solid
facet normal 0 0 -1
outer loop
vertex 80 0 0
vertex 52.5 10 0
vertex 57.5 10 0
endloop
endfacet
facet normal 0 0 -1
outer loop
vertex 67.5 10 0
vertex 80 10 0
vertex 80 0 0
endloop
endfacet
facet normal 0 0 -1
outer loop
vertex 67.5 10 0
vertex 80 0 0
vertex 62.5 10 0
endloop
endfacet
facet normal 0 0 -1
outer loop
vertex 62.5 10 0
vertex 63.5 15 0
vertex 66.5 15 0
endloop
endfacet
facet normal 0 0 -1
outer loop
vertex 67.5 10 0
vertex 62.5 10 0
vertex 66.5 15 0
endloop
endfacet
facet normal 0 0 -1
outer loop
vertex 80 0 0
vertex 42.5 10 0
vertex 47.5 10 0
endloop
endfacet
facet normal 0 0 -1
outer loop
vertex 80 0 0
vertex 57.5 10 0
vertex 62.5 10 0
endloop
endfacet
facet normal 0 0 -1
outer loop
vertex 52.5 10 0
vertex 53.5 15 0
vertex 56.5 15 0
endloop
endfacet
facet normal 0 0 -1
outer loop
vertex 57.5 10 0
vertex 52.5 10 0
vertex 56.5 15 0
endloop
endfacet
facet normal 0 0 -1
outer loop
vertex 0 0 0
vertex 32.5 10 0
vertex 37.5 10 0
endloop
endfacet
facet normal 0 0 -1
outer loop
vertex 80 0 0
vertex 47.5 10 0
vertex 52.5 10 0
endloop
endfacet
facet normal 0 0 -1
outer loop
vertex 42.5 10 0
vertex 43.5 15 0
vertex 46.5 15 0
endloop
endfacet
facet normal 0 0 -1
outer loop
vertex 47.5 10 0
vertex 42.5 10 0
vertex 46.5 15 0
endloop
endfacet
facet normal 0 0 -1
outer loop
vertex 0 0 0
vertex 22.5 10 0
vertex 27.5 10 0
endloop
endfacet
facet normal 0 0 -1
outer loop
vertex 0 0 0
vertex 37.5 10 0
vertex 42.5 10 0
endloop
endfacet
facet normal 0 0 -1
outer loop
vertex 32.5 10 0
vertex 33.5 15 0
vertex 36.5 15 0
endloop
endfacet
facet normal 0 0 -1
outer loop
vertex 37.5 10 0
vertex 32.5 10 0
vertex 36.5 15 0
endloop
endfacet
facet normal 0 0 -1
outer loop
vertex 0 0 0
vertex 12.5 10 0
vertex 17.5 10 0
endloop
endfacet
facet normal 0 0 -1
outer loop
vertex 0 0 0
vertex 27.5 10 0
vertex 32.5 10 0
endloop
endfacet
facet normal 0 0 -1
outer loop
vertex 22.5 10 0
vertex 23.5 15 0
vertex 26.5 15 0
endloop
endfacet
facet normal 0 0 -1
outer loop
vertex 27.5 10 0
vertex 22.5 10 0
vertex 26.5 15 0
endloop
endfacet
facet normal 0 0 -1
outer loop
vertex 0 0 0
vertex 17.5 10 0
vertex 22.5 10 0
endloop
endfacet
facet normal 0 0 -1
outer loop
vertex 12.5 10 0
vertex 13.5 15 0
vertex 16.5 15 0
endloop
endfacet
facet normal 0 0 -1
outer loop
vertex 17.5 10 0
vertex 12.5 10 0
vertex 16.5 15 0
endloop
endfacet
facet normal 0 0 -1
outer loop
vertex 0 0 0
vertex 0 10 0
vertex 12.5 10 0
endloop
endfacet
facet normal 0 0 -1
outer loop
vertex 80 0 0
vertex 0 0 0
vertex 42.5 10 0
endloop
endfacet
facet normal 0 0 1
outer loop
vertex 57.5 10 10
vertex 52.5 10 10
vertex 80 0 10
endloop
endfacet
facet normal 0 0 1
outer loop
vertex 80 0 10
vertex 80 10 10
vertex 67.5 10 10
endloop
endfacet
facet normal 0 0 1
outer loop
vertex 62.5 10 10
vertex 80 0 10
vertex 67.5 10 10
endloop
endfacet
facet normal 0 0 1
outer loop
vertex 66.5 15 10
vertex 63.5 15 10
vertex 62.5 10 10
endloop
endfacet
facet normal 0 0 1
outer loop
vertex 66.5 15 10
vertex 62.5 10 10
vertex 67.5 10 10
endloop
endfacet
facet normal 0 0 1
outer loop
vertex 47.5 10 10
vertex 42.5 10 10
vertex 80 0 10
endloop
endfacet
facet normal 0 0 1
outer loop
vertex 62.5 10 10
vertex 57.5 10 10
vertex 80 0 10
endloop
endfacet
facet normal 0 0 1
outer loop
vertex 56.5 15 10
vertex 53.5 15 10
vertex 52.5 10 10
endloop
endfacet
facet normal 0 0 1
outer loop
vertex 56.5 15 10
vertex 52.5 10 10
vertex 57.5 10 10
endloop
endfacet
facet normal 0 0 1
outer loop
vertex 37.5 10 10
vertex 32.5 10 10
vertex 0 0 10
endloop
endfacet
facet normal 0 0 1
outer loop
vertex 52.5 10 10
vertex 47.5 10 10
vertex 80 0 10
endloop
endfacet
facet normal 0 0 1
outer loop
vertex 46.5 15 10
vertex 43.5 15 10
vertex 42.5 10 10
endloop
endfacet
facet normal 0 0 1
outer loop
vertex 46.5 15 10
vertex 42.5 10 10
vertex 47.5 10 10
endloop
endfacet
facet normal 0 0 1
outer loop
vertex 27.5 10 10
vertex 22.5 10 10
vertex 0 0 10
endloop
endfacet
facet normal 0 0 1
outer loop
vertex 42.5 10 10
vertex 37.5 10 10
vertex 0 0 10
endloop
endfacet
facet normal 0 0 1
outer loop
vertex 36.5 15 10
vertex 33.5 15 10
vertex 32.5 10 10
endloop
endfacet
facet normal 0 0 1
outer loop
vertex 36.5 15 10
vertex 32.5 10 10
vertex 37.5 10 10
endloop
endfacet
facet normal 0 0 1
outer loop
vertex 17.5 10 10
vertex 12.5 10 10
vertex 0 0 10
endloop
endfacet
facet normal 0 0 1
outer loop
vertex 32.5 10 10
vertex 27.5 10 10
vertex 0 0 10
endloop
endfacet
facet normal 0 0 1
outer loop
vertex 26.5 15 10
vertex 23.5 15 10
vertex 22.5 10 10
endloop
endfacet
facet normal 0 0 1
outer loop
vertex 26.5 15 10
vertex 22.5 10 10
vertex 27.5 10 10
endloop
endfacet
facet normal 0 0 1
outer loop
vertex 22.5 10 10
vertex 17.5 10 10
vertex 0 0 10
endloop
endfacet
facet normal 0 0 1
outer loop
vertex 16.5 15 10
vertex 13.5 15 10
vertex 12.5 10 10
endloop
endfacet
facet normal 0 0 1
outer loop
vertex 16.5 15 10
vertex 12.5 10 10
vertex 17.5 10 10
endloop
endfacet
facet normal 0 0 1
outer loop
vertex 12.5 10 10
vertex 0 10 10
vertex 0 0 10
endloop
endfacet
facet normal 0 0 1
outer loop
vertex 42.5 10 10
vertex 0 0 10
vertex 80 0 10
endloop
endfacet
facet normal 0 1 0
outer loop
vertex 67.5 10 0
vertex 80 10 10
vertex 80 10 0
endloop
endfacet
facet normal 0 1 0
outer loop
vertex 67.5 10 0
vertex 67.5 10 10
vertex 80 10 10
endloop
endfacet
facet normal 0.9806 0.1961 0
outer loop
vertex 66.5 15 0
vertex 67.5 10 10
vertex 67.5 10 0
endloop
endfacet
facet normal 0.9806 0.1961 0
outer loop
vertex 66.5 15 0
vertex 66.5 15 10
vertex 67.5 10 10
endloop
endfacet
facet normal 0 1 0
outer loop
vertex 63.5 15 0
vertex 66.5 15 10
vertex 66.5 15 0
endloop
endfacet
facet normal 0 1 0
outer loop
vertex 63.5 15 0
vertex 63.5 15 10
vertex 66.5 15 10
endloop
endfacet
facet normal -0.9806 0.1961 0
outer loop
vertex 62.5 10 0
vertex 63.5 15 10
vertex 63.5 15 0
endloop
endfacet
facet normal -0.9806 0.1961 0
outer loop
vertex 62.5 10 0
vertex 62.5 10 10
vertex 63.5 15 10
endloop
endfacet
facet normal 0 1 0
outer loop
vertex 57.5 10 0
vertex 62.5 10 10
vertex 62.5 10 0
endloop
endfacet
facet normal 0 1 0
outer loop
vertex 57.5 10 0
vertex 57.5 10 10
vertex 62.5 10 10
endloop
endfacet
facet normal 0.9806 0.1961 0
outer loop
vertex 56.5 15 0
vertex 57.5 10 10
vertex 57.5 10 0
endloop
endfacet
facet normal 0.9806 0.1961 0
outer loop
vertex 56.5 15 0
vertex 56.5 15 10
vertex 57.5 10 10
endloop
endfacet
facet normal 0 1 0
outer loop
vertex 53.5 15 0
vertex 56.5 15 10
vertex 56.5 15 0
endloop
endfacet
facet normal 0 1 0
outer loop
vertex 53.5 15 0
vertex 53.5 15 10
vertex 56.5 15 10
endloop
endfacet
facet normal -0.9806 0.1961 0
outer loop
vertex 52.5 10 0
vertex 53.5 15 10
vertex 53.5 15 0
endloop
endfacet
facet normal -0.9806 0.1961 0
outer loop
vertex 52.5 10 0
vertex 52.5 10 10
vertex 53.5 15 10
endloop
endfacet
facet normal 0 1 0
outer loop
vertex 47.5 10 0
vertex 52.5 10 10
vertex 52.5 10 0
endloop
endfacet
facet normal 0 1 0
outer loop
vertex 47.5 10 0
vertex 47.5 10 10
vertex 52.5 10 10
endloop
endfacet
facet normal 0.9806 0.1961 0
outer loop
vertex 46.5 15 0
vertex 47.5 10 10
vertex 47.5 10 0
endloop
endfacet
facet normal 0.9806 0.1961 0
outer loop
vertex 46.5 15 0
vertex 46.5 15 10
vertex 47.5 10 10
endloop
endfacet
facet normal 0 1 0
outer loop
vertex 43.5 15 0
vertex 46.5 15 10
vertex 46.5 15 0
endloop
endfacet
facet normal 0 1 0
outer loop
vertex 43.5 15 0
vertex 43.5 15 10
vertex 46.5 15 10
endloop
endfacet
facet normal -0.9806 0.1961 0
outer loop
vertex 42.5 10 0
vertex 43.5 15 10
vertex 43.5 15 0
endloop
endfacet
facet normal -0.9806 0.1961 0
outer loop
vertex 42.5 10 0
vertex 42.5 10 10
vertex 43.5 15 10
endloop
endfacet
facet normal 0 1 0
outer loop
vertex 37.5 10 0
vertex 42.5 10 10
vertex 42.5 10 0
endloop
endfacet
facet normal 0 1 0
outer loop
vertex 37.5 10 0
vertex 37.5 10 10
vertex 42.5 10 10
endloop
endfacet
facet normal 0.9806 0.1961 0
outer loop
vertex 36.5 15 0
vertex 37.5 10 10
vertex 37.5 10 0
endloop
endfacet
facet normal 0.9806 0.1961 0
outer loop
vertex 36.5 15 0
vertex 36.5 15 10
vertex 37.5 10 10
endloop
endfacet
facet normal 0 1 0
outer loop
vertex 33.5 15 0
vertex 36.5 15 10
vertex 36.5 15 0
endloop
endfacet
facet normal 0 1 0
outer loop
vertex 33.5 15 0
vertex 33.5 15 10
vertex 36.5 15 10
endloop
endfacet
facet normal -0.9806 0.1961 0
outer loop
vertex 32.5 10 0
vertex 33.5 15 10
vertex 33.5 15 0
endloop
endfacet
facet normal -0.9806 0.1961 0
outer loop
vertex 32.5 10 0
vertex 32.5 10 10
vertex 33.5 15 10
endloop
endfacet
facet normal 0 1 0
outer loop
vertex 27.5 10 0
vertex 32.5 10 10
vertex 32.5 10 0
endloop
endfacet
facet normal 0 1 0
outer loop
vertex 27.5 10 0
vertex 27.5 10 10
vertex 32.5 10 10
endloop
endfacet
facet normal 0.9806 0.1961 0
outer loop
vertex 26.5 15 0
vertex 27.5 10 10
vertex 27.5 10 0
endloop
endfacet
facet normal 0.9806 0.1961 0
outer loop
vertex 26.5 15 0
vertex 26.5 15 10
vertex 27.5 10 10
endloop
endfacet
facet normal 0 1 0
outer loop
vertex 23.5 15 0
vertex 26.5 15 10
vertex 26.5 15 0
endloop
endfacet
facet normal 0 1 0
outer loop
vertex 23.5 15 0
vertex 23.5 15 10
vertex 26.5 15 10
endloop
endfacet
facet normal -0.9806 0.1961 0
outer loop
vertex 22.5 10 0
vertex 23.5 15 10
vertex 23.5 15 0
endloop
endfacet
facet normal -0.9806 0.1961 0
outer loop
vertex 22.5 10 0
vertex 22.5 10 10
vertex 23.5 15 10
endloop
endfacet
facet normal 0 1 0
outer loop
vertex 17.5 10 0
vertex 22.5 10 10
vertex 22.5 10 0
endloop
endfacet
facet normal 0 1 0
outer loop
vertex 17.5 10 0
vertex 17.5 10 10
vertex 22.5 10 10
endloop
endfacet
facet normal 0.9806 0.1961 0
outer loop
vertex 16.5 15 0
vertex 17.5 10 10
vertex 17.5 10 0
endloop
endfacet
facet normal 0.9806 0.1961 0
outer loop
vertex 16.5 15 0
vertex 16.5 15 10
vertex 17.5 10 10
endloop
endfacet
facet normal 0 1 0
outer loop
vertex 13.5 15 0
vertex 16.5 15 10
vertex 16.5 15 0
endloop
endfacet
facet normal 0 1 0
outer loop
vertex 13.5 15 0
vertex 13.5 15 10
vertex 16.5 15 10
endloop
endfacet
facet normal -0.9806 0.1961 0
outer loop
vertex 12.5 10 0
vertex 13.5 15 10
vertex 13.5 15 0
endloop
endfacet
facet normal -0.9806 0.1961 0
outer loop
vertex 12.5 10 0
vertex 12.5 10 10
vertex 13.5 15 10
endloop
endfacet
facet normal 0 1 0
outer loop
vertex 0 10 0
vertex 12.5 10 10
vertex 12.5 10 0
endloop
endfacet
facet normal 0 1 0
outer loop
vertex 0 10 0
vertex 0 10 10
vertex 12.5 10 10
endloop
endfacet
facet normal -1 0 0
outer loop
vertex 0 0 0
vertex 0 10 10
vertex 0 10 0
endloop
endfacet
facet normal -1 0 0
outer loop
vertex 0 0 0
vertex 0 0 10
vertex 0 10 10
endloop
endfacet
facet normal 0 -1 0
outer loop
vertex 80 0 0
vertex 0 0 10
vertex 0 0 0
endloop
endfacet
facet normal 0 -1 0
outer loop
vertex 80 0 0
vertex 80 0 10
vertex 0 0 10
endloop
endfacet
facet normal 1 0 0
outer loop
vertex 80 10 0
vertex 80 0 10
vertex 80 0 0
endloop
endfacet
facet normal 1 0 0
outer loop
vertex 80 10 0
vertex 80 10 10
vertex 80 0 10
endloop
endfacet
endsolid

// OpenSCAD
$fn = 32;

// ----------------------------------------------------------------------
// Gear rack: 6 teeth on a 80 mm bar, pitch 10 mm
// ----------------------------------------------------------------------

// --- parameters (mm) ---
profile_height = 10;      // extrusion height
profile_points = 28;      // points of the closed outline

profile = [[0, 0], [80, 0], [80, 10], [67.5, 10], [66.5, 15], [63.5, 15], [62.5, 10], [57.5, 10], [56.5, 15], [53.5, 15], [52.5, 10], [47.5, 10], [46.5, 15], [43.5, 15], [42.5, 10], [37.5, 10], [36.5, 15], [33.5, 15], [32.5, 10], [27.5, 10], [26.5, 15], [23.5, 15], [22.5, 10], [17.5, 10], [16.5, 15], [13.5, 15], [12.5, 10], [0, 10]];  // single closed polygon, 28 points, counter clockwise

// --- the one profile operation ---
linear_extrude(height = profile_height) polygon(points = profile);
